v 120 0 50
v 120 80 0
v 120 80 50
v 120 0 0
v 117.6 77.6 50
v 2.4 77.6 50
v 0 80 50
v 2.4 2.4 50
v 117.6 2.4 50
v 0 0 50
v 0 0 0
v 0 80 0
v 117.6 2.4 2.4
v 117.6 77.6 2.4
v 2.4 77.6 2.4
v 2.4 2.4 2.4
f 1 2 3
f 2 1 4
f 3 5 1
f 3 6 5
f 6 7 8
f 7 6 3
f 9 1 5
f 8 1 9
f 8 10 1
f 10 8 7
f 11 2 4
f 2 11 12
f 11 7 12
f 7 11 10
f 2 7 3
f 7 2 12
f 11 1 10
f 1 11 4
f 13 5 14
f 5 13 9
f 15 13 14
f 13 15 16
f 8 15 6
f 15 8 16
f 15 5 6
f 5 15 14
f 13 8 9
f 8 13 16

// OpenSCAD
// Generated public single-file edition of the OpenSCAD Collection storage system.
// Canonical files: core.scad + storage.scad. Do not edit this generated copy.
// OpenSCAD Collection: shared dimensions for the storage family.
// All dimensions are millimetres. Clearance is radial/per side.

function storage_inner_x(x, wall) = x - 2 * wall;
function storage_inner_y(y, wall) = y - 2 * wall;
function storage_lid_outer_x(x, lid_wall, fit) = x + 2 * (lid_wall + fit);
function storage_lid_outer_y(y, lid_wall, fit) = y + 2 * (lid_wall + fit);

module storage_validate(x, y, h, wall, floor_thickness, fit, lid_wall, lid_top, skirt, divider_height, divider_floor) {
    assert(x >= 40 && x <= 200, "Outer X must be 40..200 mm");
    assert(y >= 40 && y <= 200, "Outer Y must be 40..200 mm");
    assert(h >= 20 && h <= 150, "Outer height must be 20..150 mm");
    assert(wall >= 1.6 && wall <= 6, "Wall must be 1.6..6 mm");
    assert(floor_thickness >= 1.6 && floor_thickness <= 6, "Floor must be 1.6..6 mm");
    assert(fit >= 0.15 && fit <= 0.8, "Clearance must be 0.15..0.8 mm per side");
    assert(lid_wall >= 1.6 && lid_wall <= 6, "Lid wall must be 1.6..6 mm");
    assert(lid_top >= 1.6 && lid_top <= 6, "Lid top must be 1.6..6 mm");
    assert(skirt >= 3 && skirt <= 20, "Lid skirt must be 3..20 mm");
    assert(divider_floor >= 1.2 && divider_floor <= 5, "Divider floor must be 1.2..5 mm");
    assert(storage_inner_x(x, wall) > 12 && storage_inner_y(y, wall) > 12, "Box interior is too small");
    assert(h > floor_thickness + skirt + 2, "Box is too short for lid skirt");
    assert(divider_height >= divider_floor + 5 && divider_height <= h - floor_thickness - 2,
           "Divider must fit below the box rim");
    children();
}

module storage_box(x, y, h, wall, floor_thickness) {
    difference() {
        cube([x, y, h]);
        translate([wall, wall, floor_thickness])
            cube([storage_inner_x(x, wall), storage_inner_y(y, wall), h - floor_thickness + 0.01]);
    }
}

// Print top face on the bed. Turn the lid over to put it on the box.
module storage_lid(x, y, fit, lid_wall, lid_top, skirt) {
    outer_x = storage_lid_outer_x(x, lid_wall, fit);
    outer_y = storage_lid_outer_y(y, lid_wall, fit);
    difference() {
        cube([outer_x, outer_y, lid_top + skirt]);
        translate([lid_wall, lid_wall, lid_top])
            cube([x + 2 * fit, y + 2 * fit, skirt + 0.01]);
    }
}

// A removable two-compartment insert. Its floor keeps the partition upright.
module storage_divider(x, y, wall, fit, divider_floor, divider_height, divider_wall) {
    insert_x = storage_inner_x(x, wall) - 2 * fit;
    insert_y = storage_inner_y(y, wall) - 2 * fit;
    assert(insert_x > 2 * divider_wall && insert_y > 2 * divider_wall,
           "Divider has no usable compartments");
    union() {
        cube([insert_x, insert_y, divider_floor]);
        translate([0, (insert_y - divider_wall) / 2, divider_floor])
            cube([insert_x, divider_wall, divider_height - divider_floor]);
    }
}

// OpenSCAD Customizer entrypoint. Export each part separately.
// Keep identical settings for box, lid, and divider.

/* [Part] */
part = "box"; // [box, lid, divider]

/* [Outer dimensions, mm] */
outer_x = 120; // [40:1:200]
outer_y = 80;  // [40:1:200]
outer_h = 50;  // [20:1:150]

/* [Print and fit, mm] */
wall = 2.4;             // [1.6:0.2:6]
floor_thickness = 2.4;  // [1.6:0.2:6]
fit_clearance = 0.35;   // [0.15:0.05:0.8] Per side; increase for tight printers.

/* [Lid, mm] */
lid_wall = 2.0; // [1.6:0.2:6]
lid_top = 2.4;  // [1.6:0.2:6]
lid_skirt = 8;  // [3:1:20]

/* [Divider, mm] */
divider_floor = 1.6; // [1.2:0.2:5]
divider_wall = 2.0;  // [1.6:0.2:6]
divider_height = 30; // [7:1:140]
effective_divider_height = min(divider_height, outer_h - floor_thickness - 2);
storage_validate(outer_x, outer_y, outer_h, wall, floor_thickness,
                 fit_clearance, lid_wall, lid_top, lid_skirt,
                 effective_divider_height, divider_floor) {
    if (part == "box")
        storage_box(outer_x, outer_y, outer_h, wall, floor_thickness);
    else if (part == "lid")
        storage_lid(outer_x, outer_y, fit_clearance, lid_wall, lid_top, lid_skirt);
    else if (part == "divider")
        storage_divider(outer_x, outer_y, wall, fit_clearance,
                        divider_floor, effective_divider_height, divider_wall);
    else
        assert(false, str("Unknown part: ", part));
}
